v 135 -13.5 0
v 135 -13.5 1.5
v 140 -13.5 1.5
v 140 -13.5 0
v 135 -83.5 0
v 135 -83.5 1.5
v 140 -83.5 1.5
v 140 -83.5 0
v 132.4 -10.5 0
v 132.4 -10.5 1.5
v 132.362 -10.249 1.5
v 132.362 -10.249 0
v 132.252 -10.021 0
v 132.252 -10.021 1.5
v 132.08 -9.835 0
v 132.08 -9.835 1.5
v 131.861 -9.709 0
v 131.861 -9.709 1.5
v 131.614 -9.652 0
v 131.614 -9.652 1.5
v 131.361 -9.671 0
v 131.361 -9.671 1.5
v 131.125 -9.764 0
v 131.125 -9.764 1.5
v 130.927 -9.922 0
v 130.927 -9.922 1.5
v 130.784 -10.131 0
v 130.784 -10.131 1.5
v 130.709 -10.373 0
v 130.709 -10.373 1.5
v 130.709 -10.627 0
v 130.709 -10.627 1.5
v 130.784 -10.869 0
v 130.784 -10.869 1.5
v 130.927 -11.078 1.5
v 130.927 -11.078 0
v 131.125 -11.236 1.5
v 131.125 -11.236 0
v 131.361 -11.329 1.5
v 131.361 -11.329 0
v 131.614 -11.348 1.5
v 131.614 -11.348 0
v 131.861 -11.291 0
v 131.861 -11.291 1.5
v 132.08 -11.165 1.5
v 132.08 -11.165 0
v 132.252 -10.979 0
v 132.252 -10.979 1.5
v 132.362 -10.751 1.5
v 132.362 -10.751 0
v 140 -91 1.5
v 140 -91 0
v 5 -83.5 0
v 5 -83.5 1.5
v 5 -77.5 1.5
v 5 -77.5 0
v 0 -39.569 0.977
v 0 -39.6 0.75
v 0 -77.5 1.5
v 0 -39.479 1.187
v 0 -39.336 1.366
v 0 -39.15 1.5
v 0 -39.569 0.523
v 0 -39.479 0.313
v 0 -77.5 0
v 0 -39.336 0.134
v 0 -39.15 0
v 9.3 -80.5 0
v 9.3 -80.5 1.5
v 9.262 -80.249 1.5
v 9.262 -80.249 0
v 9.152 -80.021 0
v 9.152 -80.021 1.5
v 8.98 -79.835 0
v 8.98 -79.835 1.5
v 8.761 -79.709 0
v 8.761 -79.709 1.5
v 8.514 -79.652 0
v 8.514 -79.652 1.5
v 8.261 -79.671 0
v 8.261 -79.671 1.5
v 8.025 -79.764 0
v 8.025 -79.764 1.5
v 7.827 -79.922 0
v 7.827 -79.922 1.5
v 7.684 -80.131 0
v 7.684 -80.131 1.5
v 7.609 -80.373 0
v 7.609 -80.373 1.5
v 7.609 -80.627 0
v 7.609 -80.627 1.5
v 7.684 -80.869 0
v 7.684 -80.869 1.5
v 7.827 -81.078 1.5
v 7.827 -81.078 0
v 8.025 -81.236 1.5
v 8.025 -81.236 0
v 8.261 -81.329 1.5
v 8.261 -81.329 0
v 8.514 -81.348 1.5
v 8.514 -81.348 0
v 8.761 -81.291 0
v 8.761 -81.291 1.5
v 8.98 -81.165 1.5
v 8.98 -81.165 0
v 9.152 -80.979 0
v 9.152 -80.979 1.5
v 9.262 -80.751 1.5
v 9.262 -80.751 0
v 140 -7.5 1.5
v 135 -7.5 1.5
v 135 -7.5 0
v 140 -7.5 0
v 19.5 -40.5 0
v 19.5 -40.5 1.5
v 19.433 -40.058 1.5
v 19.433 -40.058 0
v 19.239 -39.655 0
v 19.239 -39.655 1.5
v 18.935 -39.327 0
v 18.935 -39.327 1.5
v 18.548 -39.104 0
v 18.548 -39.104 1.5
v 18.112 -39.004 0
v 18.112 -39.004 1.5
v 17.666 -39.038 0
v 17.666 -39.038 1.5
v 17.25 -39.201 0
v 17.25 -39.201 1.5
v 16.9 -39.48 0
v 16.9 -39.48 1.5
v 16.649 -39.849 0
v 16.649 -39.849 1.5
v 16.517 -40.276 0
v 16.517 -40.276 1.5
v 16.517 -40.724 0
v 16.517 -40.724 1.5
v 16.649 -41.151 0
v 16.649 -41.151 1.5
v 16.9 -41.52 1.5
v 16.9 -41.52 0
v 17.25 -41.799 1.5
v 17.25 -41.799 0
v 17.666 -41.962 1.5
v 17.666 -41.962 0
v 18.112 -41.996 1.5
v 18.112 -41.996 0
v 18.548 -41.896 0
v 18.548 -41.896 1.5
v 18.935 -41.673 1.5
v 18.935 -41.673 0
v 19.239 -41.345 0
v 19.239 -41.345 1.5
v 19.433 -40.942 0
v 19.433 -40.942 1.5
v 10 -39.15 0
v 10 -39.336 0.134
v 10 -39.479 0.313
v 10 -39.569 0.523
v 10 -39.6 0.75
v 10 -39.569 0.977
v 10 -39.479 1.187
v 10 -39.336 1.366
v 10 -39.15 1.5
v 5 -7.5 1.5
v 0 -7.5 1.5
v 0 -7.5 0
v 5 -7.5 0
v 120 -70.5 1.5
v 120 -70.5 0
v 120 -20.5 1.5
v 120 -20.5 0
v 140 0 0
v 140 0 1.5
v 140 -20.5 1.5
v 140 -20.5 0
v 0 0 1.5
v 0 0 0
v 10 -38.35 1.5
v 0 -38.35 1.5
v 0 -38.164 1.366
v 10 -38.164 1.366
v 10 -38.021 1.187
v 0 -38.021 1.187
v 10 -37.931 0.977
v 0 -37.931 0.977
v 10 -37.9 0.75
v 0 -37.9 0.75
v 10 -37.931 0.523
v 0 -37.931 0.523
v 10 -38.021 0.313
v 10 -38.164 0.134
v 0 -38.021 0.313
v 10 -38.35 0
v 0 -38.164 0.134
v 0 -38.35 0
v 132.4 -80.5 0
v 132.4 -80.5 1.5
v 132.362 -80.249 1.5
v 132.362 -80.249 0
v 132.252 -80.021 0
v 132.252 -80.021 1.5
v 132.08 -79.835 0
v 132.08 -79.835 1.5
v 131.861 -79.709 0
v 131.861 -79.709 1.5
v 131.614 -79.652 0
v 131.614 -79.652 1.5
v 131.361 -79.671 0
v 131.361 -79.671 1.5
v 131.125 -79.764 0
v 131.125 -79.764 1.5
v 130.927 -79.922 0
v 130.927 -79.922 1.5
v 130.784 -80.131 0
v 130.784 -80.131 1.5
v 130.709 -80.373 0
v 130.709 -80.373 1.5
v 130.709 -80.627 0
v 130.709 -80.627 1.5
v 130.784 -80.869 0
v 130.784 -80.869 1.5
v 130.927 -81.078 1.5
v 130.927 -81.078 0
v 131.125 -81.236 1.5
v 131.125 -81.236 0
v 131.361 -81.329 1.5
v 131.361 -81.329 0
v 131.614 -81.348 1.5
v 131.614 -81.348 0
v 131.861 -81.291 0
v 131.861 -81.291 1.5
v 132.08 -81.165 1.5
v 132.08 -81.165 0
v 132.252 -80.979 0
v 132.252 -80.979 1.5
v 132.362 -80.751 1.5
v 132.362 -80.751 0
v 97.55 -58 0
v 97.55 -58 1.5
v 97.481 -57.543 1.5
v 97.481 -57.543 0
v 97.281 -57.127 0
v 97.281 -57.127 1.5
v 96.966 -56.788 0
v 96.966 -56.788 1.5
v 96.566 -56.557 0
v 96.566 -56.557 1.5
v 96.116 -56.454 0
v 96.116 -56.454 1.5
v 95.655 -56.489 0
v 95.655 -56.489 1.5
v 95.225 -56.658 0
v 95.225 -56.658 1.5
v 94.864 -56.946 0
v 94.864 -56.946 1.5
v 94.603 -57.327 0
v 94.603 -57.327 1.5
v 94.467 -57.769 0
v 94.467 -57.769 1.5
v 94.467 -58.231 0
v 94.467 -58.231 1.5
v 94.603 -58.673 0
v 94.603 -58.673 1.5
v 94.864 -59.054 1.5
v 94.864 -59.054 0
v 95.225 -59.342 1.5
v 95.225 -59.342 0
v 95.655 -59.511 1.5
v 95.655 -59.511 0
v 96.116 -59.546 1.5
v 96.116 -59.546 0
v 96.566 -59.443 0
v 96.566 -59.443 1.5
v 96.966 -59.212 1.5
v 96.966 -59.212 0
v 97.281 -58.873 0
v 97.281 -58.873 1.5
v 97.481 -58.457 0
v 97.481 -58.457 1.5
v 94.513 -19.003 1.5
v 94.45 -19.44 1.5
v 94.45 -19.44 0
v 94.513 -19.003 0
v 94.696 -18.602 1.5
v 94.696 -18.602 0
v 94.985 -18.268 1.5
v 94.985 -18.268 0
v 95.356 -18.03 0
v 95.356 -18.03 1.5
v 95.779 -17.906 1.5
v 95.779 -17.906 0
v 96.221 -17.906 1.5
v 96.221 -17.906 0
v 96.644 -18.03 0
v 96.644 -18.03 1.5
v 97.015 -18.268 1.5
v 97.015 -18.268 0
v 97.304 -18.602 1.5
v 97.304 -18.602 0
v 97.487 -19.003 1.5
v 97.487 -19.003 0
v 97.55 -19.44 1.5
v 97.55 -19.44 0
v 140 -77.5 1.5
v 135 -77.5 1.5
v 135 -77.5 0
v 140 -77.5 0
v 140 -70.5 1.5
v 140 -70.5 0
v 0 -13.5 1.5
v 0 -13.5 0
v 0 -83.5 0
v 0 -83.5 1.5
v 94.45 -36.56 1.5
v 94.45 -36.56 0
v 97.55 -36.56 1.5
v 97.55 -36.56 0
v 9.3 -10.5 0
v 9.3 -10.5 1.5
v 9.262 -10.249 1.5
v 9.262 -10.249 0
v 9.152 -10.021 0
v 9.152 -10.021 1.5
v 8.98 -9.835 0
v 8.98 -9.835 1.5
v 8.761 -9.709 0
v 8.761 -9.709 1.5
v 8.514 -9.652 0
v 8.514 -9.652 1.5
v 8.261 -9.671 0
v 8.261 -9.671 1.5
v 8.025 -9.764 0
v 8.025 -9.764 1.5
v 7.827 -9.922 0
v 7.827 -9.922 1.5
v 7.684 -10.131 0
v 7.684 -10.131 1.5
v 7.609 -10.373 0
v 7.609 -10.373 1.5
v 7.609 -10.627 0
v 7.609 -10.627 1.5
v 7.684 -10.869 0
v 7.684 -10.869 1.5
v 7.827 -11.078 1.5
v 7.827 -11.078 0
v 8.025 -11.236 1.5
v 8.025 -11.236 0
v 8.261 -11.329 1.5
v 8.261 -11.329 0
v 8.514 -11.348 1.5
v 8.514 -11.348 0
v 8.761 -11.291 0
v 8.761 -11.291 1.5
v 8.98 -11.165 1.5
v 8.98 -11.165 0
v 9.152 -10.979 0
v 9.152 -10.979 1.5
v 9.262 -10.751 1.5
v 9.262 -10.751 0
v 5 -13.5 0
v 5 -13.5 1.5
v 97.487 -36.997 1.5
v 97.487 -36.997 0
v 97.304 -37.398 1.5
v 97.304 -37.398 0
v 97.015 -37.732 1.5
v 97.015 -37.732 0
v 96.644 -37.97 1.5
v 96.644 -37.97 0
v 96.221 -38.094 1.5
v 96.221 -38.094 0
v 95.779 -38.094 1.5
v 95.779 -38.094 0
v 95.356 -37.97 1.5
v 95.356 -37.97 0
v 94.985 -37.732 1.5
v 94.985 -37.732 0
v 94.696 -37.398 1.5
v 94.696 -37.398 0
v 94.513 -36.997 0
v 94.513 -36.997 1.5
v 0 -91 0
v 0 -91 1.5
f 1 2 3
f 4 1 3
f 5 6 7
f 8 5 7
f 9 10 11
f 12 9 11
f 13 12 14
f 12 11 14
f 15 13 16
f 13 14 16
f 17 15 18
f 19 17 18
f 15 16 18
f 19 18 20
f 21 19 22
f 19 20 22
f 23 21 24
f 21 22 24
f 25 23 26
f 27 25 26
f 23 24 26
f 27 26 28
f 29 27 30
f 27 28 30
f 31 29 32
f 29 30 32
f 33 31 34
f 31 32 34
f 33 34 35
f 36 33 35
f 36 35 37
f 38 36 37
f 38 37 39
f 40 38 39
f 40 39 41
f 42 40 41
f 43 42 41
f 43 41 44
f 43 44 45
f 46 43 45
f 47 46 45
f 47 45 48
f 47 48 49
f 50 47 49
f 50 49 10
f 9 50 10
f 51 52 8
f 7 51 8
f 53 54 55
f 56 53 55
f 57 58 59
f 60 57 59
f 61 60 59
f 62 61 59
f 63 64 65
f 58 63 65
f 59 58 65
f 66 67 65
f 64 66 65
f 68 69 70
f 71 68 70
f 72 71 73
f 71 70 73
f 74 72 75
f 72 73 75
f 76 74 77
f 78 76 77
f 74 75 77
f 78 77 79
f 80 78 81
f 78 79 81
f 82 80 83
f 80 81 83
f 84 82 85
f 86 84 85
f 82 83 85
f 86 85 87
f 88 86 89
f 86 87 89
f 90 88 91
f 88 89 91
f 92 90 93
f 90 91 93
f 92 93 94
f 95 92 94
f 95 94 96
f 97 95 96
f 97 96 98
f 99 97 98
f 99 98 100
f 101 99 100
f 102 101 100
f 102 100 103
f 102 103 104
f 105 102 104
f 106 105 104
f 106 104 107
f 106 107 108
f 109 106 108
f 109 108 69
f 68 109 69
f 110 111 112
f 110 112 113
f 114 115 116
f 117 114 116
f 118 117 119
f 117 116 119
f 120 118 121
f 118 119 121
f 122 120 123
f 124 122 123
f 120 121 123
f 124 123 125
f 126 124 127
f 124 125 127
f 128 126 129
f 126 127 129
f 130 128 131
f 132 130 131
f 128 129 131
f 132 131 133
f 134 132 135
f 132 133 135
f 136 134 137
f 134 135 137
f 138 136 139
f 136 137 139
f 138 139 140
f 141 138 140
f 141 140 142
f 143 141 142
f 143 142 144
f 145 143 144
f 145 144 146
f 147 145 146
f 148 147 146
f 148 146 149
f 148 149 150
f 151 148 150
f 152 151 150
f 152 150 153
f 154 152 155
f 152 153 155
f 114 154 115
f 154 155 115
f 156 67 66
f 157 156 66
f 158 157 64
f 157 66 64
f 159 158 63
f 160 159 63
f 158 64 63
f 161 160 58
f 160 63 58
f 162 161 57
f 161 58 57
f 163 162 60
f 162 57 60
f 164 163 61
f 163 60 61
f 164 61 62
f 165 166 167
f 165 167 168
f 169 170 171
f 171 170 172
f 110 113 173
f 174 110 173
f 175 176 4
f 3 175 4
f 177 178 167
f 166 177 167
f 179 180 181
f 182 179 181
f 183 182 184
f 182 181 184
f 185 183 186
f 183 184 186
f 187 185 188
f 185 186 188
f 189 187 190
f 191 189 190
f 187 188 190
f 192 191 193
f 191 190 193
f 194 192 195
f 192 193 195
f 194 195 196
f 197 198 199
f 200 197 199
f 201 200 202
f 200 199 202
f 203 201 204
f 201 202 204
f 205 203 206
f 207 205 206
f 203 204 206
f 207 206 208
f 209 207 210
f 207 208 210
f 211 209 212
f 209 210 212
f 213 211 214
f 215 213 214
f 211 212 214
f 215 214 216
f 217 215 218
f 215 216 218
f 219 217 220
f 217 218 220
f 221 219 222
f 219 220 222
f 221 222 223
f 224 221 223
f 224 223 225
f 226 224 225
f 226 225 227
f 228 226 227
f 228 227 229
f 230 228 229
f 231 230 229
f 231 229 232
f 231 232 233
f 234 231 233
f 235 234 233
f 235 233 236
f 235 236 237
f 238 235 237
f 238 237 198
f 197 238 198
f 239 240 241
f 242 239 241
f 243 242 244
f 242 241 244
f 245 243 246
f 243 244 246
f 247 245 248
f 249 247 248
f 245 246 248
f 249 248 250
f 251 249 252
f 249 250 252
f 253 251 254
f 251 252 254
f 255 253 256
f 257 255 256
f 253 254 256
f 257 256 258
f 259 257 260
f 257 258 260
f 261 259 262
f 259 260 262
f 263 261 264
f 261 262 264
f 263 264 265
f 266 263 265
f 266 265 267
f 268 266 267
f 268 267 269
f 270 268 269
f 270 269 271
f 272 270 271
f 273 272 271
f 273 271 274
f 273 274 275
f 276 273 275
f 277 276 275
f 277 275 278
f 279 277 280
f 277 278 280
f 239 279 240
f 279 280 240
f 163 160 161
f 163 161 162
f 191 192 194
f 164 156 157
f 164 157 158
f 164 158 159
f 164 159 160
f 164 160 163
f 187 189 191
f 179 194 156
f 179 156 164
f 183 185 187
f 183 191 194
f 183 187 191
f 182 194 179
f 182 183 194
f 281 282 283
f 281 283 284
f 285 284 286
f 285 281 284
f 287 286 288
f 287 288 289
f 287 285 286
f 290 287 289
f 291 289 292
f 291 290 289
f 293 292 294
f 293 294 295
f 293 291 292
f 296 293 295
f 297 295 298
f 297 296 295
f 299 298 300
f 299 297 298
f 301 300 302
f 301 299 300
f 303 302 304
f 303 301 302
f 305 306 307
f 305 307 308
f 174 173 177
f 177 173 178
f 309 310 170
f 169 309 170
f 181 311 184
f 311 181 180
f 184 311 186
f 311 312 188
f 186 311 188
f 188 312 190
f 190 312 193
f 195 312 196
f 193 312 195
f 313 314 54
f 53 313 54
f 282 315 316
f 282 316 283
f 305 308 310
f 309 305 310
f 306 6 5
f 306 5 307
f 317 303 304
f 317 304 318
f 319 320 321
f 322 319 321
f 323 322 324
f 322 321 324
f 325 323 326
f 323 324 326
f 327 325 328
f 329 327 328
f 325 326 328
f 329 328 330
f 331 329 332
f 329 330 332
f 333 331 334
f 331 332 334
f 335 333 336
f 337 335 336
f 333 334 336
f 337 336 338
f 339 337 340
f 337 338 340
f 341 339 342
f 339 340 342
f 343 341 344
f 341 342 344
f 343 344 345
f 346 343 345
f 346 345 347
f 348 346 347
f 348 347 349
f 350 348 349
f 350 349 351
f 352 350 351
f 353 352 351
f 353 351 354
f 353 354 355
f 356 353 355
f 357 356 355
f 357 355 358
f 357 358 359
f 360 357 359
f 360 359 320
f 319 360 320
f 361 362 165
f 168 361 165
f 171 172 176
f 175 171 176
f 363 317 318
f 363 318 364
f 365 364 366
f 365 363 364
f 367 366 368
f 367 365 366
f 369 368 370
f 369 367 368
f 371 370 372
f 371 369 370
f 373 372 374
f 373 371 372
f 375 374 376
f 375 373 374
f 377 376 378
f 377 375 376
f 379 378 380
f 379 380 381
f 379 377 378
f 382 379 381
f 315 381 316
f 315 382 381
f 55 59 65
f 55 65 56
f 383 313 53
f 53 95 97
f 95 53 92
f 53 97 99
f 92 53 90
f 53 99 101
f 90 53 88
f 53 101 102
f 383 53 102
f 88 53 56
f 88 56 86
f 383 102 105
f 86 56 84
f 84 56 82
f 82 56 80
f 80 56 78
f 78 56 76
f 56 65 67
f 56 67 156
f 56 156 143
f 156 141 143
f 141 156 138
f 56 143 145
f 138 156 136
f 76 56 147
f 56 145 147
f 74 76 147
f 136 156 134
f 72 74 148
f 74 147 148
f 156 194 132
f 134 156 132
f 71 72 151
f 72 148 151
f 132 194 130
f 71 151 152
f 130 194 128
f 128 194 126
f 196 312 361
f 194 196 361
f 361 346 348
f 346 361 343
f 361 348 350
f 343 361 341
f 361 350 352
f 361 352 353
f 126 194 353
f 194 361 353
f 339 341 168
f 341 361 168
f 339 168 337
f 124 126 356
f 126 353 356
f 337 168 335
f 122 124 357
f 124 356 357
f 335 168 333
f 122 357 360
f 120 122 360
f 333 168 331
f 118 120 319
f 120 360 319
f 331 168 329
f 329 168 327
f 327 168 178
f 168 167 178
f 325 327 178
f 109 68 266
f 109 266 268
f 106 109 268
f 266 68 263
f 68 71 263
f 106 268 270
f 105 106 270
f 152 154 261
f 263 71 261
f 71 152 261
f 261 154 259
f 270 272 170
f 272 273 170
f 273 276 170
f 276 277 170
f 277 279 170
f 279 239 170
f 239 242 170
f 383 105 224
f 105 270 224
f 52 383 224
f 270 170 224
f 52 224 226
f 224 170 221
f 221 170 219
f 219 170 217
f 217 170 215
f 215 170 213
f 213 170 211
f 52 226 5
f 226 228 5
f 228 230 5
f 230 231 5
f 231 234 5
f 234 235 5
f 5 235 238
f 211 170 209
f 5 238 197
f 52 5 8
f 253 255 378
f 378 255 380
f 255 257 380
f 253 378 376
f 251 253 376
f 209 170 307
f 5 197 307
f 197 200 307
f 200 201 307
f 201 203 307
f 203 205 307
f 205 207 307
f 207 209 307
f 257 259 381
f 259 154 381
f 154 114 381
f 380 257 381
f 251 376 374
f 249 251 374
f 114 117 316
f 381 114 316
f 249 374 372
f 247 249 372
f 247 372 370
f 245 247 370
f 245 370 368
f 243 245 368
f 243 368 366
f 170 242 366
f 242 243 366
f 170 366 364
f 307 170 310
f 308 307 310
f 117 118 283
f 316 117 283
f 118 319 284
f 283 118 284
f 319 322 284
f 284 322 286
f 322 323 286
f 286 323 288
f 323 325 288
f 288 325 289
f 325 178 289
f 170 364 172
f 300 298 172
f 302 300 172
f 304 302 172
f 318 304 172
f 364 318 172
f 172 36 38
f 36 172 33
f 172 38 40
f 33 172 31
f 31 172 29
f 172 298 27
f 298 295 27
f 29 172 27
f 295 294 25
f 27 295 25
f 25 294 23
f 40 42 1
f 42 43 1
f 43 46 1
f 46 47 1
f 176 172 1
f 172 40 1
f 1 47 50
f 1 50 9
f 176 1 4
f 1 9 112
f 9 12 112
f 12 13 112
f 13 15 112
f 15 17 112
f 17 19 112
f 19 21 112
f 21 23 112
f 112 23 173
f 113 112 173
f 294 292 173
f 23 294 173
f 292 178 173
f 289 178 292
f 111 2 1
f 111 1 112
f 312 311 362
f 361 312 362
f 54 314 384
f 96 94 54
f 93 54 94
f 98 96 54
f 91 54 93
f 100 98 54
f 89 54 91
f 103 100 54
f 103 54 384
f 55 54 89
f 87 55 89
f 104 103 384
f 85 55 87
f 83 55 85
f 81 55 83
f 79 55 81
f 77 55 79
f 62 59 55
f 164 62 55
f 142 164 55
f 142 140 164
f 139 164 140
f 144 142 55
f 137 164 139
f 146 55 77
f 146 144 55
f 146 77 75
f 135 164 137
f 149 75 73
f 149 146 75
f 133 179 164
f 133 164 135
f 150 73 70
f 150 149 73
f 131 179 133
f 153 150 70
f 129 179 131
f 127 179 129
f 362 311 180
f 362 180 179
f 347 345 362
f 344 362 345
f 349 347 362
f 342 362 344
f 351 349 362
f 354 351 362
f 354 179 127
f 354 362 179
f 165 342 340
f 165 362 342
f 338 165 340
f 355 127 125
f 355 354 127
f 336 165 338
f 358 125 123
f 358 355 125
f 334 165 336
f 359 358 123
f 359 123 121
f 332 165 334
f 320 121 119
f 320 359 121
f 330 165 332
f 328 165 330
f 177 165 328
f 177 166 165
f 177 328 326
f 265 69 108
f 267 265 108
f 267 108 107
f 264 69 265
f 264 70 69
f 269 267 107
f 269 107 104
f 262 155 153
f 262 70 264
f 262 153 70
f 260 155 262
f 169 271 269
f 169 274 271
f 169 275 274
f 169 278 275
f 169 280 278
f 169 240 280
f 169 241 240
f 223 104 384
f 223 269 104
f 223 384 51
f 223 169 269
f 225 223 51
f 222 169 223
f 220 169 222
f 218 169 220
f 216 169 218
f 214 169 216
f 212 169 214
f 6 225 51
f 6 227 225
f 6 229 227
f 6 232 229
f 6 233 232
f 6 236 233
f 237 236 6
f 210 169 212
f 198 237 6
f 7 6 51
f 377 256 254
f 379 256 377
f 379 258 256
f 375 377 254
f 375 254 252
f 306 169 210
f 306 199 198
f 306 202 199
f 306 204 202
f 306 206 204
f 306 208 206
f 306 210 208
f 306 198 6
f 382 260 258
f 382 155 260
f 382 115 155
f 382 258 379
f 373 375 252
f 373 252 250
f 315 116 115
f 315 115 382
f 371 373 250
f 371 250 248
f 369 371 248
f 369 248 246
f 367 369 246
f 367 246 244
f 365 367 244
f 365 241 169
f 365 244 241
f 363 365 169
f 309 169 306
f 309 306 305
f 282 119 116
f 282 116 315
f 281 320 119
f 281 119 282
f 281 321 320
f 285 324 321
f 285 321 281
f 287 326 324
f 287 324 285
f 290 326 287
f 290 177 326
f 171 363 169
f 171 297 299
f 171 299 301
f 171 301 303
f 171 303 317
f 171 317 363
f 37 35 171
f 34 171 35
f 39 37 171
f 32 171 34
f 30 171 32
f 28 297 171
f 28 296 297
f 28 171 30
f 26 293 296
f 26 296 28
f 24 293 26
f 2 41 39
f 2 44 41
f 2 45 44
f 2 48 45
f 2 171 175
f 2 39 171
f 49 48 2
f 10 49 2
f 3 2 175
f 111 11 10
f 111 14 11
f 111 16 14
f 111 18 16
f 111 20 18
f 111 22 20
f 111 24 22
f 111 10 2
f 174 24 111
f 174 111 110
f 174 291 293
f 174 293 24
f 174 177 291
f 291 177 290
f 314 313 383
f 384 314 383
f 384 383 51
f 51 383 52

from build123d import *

# Parameters (mm, degrees)
BOSS_EXTRUDE1_DEPTH = 1.5
SKETCH3_R           = 1.5
SKETCH3_R_2         = 1.55
CUT_EXTRUDE1_DEPTH  = 1.5
SKETCH10_W          = 5
SKETCH10_H          = 6
SKETCH10_R          = 0.85
CUT_EXTRUDE5_DEPTH  = 167.982783544
SKETCH8_R           = 0.85
CUT_EXTRUDE4_DEPTH  = 10


with BuildPart() as part:
    # Sketch1 → Boss-Extrude1 (new body)
    with BuildSketch(Plane.XY):
        Polygon((140, 0), (0, 0), (0, -91), (140, -91), (140, -70.5), (120, -70.5), (120, -20.5), (140, -20.5), align=None)
    extrude(amount=BOSS_EXTRUDE1_DEPTH)

    # Sketch3 → Cut-Extrude1 (cut)
    with BuildSketch(Plane.XY.offset(1.5)):
        with Locations((18, -40.5)):
            Circle(SKETCH3_R)
        with Locations((96, -58)):
            Circle(SKETCH3_R_2)
        with BuildLine():
            Line((97.55, -19.439908336), (97.55, -36.560091664))
            ThreePointArc((97.55, -36.560091664), (96, -38.110091664), (94.45, -36.560091664))
            Line((94.45, -36.560091664), (94.45, -19.439908336))
            ThreePointArc((94.45, -19.439908336), (96, -17.889908336), (97.55, -19.439908336))
        make_face()
    extrude(amount=-CUT_EXTRUDE1_DEPTH, mode=Mode.SUBTRACT)

    # Sketch10 → Cut-Extrude5 (cut, through all)
    with BuildSketch(Plane.XY.offset(1.5)):
        with Locations((2.5, -10.5)):
            Rectangle(SKETCH10_W, SKETCH10_H)
        with Locations((2.5, -80.5)):
            Rectangle(SKETCH10_W, SKETCH10_H)
        with Locations((137.5, -10.5)):
            Rectangle(SKETCH10_W, SKETCH10_H)
        with Locations((137.5, -80.5)):
            Rectangle(SKETCH10_W, SKETCH10_H)
        with Locations((8.45, -10.5)):
            Circle(SKETCH10_R)
        with Locations((8.45, -80.5)):
            Circle(SKETCH10_R)
        with Locations((131.55, -10.5)):
            Circle(SKETCH10_R)
        with Locations((131.55, -80.5)):
            Circle(SKETCH10_R)
    extrude(amount=-CUT_EXTRUDE5_DEPTH, mode=Mode.SUBTRACT)

    # Sketch8 → Cut-Extrude4 (cut)
    with BuildSketch(Plane.ZY):
        with Locations((0.75, -38.75)):
            Circle(SKETCH8_R)
        with Locations((0.75, 31.25)):
            Circle(SKETCH8_R)
    extrude(amount=-CUT_EXTRUDE4_DEPTH, mode=Mode.SUBTRACT)


solid = part.part
